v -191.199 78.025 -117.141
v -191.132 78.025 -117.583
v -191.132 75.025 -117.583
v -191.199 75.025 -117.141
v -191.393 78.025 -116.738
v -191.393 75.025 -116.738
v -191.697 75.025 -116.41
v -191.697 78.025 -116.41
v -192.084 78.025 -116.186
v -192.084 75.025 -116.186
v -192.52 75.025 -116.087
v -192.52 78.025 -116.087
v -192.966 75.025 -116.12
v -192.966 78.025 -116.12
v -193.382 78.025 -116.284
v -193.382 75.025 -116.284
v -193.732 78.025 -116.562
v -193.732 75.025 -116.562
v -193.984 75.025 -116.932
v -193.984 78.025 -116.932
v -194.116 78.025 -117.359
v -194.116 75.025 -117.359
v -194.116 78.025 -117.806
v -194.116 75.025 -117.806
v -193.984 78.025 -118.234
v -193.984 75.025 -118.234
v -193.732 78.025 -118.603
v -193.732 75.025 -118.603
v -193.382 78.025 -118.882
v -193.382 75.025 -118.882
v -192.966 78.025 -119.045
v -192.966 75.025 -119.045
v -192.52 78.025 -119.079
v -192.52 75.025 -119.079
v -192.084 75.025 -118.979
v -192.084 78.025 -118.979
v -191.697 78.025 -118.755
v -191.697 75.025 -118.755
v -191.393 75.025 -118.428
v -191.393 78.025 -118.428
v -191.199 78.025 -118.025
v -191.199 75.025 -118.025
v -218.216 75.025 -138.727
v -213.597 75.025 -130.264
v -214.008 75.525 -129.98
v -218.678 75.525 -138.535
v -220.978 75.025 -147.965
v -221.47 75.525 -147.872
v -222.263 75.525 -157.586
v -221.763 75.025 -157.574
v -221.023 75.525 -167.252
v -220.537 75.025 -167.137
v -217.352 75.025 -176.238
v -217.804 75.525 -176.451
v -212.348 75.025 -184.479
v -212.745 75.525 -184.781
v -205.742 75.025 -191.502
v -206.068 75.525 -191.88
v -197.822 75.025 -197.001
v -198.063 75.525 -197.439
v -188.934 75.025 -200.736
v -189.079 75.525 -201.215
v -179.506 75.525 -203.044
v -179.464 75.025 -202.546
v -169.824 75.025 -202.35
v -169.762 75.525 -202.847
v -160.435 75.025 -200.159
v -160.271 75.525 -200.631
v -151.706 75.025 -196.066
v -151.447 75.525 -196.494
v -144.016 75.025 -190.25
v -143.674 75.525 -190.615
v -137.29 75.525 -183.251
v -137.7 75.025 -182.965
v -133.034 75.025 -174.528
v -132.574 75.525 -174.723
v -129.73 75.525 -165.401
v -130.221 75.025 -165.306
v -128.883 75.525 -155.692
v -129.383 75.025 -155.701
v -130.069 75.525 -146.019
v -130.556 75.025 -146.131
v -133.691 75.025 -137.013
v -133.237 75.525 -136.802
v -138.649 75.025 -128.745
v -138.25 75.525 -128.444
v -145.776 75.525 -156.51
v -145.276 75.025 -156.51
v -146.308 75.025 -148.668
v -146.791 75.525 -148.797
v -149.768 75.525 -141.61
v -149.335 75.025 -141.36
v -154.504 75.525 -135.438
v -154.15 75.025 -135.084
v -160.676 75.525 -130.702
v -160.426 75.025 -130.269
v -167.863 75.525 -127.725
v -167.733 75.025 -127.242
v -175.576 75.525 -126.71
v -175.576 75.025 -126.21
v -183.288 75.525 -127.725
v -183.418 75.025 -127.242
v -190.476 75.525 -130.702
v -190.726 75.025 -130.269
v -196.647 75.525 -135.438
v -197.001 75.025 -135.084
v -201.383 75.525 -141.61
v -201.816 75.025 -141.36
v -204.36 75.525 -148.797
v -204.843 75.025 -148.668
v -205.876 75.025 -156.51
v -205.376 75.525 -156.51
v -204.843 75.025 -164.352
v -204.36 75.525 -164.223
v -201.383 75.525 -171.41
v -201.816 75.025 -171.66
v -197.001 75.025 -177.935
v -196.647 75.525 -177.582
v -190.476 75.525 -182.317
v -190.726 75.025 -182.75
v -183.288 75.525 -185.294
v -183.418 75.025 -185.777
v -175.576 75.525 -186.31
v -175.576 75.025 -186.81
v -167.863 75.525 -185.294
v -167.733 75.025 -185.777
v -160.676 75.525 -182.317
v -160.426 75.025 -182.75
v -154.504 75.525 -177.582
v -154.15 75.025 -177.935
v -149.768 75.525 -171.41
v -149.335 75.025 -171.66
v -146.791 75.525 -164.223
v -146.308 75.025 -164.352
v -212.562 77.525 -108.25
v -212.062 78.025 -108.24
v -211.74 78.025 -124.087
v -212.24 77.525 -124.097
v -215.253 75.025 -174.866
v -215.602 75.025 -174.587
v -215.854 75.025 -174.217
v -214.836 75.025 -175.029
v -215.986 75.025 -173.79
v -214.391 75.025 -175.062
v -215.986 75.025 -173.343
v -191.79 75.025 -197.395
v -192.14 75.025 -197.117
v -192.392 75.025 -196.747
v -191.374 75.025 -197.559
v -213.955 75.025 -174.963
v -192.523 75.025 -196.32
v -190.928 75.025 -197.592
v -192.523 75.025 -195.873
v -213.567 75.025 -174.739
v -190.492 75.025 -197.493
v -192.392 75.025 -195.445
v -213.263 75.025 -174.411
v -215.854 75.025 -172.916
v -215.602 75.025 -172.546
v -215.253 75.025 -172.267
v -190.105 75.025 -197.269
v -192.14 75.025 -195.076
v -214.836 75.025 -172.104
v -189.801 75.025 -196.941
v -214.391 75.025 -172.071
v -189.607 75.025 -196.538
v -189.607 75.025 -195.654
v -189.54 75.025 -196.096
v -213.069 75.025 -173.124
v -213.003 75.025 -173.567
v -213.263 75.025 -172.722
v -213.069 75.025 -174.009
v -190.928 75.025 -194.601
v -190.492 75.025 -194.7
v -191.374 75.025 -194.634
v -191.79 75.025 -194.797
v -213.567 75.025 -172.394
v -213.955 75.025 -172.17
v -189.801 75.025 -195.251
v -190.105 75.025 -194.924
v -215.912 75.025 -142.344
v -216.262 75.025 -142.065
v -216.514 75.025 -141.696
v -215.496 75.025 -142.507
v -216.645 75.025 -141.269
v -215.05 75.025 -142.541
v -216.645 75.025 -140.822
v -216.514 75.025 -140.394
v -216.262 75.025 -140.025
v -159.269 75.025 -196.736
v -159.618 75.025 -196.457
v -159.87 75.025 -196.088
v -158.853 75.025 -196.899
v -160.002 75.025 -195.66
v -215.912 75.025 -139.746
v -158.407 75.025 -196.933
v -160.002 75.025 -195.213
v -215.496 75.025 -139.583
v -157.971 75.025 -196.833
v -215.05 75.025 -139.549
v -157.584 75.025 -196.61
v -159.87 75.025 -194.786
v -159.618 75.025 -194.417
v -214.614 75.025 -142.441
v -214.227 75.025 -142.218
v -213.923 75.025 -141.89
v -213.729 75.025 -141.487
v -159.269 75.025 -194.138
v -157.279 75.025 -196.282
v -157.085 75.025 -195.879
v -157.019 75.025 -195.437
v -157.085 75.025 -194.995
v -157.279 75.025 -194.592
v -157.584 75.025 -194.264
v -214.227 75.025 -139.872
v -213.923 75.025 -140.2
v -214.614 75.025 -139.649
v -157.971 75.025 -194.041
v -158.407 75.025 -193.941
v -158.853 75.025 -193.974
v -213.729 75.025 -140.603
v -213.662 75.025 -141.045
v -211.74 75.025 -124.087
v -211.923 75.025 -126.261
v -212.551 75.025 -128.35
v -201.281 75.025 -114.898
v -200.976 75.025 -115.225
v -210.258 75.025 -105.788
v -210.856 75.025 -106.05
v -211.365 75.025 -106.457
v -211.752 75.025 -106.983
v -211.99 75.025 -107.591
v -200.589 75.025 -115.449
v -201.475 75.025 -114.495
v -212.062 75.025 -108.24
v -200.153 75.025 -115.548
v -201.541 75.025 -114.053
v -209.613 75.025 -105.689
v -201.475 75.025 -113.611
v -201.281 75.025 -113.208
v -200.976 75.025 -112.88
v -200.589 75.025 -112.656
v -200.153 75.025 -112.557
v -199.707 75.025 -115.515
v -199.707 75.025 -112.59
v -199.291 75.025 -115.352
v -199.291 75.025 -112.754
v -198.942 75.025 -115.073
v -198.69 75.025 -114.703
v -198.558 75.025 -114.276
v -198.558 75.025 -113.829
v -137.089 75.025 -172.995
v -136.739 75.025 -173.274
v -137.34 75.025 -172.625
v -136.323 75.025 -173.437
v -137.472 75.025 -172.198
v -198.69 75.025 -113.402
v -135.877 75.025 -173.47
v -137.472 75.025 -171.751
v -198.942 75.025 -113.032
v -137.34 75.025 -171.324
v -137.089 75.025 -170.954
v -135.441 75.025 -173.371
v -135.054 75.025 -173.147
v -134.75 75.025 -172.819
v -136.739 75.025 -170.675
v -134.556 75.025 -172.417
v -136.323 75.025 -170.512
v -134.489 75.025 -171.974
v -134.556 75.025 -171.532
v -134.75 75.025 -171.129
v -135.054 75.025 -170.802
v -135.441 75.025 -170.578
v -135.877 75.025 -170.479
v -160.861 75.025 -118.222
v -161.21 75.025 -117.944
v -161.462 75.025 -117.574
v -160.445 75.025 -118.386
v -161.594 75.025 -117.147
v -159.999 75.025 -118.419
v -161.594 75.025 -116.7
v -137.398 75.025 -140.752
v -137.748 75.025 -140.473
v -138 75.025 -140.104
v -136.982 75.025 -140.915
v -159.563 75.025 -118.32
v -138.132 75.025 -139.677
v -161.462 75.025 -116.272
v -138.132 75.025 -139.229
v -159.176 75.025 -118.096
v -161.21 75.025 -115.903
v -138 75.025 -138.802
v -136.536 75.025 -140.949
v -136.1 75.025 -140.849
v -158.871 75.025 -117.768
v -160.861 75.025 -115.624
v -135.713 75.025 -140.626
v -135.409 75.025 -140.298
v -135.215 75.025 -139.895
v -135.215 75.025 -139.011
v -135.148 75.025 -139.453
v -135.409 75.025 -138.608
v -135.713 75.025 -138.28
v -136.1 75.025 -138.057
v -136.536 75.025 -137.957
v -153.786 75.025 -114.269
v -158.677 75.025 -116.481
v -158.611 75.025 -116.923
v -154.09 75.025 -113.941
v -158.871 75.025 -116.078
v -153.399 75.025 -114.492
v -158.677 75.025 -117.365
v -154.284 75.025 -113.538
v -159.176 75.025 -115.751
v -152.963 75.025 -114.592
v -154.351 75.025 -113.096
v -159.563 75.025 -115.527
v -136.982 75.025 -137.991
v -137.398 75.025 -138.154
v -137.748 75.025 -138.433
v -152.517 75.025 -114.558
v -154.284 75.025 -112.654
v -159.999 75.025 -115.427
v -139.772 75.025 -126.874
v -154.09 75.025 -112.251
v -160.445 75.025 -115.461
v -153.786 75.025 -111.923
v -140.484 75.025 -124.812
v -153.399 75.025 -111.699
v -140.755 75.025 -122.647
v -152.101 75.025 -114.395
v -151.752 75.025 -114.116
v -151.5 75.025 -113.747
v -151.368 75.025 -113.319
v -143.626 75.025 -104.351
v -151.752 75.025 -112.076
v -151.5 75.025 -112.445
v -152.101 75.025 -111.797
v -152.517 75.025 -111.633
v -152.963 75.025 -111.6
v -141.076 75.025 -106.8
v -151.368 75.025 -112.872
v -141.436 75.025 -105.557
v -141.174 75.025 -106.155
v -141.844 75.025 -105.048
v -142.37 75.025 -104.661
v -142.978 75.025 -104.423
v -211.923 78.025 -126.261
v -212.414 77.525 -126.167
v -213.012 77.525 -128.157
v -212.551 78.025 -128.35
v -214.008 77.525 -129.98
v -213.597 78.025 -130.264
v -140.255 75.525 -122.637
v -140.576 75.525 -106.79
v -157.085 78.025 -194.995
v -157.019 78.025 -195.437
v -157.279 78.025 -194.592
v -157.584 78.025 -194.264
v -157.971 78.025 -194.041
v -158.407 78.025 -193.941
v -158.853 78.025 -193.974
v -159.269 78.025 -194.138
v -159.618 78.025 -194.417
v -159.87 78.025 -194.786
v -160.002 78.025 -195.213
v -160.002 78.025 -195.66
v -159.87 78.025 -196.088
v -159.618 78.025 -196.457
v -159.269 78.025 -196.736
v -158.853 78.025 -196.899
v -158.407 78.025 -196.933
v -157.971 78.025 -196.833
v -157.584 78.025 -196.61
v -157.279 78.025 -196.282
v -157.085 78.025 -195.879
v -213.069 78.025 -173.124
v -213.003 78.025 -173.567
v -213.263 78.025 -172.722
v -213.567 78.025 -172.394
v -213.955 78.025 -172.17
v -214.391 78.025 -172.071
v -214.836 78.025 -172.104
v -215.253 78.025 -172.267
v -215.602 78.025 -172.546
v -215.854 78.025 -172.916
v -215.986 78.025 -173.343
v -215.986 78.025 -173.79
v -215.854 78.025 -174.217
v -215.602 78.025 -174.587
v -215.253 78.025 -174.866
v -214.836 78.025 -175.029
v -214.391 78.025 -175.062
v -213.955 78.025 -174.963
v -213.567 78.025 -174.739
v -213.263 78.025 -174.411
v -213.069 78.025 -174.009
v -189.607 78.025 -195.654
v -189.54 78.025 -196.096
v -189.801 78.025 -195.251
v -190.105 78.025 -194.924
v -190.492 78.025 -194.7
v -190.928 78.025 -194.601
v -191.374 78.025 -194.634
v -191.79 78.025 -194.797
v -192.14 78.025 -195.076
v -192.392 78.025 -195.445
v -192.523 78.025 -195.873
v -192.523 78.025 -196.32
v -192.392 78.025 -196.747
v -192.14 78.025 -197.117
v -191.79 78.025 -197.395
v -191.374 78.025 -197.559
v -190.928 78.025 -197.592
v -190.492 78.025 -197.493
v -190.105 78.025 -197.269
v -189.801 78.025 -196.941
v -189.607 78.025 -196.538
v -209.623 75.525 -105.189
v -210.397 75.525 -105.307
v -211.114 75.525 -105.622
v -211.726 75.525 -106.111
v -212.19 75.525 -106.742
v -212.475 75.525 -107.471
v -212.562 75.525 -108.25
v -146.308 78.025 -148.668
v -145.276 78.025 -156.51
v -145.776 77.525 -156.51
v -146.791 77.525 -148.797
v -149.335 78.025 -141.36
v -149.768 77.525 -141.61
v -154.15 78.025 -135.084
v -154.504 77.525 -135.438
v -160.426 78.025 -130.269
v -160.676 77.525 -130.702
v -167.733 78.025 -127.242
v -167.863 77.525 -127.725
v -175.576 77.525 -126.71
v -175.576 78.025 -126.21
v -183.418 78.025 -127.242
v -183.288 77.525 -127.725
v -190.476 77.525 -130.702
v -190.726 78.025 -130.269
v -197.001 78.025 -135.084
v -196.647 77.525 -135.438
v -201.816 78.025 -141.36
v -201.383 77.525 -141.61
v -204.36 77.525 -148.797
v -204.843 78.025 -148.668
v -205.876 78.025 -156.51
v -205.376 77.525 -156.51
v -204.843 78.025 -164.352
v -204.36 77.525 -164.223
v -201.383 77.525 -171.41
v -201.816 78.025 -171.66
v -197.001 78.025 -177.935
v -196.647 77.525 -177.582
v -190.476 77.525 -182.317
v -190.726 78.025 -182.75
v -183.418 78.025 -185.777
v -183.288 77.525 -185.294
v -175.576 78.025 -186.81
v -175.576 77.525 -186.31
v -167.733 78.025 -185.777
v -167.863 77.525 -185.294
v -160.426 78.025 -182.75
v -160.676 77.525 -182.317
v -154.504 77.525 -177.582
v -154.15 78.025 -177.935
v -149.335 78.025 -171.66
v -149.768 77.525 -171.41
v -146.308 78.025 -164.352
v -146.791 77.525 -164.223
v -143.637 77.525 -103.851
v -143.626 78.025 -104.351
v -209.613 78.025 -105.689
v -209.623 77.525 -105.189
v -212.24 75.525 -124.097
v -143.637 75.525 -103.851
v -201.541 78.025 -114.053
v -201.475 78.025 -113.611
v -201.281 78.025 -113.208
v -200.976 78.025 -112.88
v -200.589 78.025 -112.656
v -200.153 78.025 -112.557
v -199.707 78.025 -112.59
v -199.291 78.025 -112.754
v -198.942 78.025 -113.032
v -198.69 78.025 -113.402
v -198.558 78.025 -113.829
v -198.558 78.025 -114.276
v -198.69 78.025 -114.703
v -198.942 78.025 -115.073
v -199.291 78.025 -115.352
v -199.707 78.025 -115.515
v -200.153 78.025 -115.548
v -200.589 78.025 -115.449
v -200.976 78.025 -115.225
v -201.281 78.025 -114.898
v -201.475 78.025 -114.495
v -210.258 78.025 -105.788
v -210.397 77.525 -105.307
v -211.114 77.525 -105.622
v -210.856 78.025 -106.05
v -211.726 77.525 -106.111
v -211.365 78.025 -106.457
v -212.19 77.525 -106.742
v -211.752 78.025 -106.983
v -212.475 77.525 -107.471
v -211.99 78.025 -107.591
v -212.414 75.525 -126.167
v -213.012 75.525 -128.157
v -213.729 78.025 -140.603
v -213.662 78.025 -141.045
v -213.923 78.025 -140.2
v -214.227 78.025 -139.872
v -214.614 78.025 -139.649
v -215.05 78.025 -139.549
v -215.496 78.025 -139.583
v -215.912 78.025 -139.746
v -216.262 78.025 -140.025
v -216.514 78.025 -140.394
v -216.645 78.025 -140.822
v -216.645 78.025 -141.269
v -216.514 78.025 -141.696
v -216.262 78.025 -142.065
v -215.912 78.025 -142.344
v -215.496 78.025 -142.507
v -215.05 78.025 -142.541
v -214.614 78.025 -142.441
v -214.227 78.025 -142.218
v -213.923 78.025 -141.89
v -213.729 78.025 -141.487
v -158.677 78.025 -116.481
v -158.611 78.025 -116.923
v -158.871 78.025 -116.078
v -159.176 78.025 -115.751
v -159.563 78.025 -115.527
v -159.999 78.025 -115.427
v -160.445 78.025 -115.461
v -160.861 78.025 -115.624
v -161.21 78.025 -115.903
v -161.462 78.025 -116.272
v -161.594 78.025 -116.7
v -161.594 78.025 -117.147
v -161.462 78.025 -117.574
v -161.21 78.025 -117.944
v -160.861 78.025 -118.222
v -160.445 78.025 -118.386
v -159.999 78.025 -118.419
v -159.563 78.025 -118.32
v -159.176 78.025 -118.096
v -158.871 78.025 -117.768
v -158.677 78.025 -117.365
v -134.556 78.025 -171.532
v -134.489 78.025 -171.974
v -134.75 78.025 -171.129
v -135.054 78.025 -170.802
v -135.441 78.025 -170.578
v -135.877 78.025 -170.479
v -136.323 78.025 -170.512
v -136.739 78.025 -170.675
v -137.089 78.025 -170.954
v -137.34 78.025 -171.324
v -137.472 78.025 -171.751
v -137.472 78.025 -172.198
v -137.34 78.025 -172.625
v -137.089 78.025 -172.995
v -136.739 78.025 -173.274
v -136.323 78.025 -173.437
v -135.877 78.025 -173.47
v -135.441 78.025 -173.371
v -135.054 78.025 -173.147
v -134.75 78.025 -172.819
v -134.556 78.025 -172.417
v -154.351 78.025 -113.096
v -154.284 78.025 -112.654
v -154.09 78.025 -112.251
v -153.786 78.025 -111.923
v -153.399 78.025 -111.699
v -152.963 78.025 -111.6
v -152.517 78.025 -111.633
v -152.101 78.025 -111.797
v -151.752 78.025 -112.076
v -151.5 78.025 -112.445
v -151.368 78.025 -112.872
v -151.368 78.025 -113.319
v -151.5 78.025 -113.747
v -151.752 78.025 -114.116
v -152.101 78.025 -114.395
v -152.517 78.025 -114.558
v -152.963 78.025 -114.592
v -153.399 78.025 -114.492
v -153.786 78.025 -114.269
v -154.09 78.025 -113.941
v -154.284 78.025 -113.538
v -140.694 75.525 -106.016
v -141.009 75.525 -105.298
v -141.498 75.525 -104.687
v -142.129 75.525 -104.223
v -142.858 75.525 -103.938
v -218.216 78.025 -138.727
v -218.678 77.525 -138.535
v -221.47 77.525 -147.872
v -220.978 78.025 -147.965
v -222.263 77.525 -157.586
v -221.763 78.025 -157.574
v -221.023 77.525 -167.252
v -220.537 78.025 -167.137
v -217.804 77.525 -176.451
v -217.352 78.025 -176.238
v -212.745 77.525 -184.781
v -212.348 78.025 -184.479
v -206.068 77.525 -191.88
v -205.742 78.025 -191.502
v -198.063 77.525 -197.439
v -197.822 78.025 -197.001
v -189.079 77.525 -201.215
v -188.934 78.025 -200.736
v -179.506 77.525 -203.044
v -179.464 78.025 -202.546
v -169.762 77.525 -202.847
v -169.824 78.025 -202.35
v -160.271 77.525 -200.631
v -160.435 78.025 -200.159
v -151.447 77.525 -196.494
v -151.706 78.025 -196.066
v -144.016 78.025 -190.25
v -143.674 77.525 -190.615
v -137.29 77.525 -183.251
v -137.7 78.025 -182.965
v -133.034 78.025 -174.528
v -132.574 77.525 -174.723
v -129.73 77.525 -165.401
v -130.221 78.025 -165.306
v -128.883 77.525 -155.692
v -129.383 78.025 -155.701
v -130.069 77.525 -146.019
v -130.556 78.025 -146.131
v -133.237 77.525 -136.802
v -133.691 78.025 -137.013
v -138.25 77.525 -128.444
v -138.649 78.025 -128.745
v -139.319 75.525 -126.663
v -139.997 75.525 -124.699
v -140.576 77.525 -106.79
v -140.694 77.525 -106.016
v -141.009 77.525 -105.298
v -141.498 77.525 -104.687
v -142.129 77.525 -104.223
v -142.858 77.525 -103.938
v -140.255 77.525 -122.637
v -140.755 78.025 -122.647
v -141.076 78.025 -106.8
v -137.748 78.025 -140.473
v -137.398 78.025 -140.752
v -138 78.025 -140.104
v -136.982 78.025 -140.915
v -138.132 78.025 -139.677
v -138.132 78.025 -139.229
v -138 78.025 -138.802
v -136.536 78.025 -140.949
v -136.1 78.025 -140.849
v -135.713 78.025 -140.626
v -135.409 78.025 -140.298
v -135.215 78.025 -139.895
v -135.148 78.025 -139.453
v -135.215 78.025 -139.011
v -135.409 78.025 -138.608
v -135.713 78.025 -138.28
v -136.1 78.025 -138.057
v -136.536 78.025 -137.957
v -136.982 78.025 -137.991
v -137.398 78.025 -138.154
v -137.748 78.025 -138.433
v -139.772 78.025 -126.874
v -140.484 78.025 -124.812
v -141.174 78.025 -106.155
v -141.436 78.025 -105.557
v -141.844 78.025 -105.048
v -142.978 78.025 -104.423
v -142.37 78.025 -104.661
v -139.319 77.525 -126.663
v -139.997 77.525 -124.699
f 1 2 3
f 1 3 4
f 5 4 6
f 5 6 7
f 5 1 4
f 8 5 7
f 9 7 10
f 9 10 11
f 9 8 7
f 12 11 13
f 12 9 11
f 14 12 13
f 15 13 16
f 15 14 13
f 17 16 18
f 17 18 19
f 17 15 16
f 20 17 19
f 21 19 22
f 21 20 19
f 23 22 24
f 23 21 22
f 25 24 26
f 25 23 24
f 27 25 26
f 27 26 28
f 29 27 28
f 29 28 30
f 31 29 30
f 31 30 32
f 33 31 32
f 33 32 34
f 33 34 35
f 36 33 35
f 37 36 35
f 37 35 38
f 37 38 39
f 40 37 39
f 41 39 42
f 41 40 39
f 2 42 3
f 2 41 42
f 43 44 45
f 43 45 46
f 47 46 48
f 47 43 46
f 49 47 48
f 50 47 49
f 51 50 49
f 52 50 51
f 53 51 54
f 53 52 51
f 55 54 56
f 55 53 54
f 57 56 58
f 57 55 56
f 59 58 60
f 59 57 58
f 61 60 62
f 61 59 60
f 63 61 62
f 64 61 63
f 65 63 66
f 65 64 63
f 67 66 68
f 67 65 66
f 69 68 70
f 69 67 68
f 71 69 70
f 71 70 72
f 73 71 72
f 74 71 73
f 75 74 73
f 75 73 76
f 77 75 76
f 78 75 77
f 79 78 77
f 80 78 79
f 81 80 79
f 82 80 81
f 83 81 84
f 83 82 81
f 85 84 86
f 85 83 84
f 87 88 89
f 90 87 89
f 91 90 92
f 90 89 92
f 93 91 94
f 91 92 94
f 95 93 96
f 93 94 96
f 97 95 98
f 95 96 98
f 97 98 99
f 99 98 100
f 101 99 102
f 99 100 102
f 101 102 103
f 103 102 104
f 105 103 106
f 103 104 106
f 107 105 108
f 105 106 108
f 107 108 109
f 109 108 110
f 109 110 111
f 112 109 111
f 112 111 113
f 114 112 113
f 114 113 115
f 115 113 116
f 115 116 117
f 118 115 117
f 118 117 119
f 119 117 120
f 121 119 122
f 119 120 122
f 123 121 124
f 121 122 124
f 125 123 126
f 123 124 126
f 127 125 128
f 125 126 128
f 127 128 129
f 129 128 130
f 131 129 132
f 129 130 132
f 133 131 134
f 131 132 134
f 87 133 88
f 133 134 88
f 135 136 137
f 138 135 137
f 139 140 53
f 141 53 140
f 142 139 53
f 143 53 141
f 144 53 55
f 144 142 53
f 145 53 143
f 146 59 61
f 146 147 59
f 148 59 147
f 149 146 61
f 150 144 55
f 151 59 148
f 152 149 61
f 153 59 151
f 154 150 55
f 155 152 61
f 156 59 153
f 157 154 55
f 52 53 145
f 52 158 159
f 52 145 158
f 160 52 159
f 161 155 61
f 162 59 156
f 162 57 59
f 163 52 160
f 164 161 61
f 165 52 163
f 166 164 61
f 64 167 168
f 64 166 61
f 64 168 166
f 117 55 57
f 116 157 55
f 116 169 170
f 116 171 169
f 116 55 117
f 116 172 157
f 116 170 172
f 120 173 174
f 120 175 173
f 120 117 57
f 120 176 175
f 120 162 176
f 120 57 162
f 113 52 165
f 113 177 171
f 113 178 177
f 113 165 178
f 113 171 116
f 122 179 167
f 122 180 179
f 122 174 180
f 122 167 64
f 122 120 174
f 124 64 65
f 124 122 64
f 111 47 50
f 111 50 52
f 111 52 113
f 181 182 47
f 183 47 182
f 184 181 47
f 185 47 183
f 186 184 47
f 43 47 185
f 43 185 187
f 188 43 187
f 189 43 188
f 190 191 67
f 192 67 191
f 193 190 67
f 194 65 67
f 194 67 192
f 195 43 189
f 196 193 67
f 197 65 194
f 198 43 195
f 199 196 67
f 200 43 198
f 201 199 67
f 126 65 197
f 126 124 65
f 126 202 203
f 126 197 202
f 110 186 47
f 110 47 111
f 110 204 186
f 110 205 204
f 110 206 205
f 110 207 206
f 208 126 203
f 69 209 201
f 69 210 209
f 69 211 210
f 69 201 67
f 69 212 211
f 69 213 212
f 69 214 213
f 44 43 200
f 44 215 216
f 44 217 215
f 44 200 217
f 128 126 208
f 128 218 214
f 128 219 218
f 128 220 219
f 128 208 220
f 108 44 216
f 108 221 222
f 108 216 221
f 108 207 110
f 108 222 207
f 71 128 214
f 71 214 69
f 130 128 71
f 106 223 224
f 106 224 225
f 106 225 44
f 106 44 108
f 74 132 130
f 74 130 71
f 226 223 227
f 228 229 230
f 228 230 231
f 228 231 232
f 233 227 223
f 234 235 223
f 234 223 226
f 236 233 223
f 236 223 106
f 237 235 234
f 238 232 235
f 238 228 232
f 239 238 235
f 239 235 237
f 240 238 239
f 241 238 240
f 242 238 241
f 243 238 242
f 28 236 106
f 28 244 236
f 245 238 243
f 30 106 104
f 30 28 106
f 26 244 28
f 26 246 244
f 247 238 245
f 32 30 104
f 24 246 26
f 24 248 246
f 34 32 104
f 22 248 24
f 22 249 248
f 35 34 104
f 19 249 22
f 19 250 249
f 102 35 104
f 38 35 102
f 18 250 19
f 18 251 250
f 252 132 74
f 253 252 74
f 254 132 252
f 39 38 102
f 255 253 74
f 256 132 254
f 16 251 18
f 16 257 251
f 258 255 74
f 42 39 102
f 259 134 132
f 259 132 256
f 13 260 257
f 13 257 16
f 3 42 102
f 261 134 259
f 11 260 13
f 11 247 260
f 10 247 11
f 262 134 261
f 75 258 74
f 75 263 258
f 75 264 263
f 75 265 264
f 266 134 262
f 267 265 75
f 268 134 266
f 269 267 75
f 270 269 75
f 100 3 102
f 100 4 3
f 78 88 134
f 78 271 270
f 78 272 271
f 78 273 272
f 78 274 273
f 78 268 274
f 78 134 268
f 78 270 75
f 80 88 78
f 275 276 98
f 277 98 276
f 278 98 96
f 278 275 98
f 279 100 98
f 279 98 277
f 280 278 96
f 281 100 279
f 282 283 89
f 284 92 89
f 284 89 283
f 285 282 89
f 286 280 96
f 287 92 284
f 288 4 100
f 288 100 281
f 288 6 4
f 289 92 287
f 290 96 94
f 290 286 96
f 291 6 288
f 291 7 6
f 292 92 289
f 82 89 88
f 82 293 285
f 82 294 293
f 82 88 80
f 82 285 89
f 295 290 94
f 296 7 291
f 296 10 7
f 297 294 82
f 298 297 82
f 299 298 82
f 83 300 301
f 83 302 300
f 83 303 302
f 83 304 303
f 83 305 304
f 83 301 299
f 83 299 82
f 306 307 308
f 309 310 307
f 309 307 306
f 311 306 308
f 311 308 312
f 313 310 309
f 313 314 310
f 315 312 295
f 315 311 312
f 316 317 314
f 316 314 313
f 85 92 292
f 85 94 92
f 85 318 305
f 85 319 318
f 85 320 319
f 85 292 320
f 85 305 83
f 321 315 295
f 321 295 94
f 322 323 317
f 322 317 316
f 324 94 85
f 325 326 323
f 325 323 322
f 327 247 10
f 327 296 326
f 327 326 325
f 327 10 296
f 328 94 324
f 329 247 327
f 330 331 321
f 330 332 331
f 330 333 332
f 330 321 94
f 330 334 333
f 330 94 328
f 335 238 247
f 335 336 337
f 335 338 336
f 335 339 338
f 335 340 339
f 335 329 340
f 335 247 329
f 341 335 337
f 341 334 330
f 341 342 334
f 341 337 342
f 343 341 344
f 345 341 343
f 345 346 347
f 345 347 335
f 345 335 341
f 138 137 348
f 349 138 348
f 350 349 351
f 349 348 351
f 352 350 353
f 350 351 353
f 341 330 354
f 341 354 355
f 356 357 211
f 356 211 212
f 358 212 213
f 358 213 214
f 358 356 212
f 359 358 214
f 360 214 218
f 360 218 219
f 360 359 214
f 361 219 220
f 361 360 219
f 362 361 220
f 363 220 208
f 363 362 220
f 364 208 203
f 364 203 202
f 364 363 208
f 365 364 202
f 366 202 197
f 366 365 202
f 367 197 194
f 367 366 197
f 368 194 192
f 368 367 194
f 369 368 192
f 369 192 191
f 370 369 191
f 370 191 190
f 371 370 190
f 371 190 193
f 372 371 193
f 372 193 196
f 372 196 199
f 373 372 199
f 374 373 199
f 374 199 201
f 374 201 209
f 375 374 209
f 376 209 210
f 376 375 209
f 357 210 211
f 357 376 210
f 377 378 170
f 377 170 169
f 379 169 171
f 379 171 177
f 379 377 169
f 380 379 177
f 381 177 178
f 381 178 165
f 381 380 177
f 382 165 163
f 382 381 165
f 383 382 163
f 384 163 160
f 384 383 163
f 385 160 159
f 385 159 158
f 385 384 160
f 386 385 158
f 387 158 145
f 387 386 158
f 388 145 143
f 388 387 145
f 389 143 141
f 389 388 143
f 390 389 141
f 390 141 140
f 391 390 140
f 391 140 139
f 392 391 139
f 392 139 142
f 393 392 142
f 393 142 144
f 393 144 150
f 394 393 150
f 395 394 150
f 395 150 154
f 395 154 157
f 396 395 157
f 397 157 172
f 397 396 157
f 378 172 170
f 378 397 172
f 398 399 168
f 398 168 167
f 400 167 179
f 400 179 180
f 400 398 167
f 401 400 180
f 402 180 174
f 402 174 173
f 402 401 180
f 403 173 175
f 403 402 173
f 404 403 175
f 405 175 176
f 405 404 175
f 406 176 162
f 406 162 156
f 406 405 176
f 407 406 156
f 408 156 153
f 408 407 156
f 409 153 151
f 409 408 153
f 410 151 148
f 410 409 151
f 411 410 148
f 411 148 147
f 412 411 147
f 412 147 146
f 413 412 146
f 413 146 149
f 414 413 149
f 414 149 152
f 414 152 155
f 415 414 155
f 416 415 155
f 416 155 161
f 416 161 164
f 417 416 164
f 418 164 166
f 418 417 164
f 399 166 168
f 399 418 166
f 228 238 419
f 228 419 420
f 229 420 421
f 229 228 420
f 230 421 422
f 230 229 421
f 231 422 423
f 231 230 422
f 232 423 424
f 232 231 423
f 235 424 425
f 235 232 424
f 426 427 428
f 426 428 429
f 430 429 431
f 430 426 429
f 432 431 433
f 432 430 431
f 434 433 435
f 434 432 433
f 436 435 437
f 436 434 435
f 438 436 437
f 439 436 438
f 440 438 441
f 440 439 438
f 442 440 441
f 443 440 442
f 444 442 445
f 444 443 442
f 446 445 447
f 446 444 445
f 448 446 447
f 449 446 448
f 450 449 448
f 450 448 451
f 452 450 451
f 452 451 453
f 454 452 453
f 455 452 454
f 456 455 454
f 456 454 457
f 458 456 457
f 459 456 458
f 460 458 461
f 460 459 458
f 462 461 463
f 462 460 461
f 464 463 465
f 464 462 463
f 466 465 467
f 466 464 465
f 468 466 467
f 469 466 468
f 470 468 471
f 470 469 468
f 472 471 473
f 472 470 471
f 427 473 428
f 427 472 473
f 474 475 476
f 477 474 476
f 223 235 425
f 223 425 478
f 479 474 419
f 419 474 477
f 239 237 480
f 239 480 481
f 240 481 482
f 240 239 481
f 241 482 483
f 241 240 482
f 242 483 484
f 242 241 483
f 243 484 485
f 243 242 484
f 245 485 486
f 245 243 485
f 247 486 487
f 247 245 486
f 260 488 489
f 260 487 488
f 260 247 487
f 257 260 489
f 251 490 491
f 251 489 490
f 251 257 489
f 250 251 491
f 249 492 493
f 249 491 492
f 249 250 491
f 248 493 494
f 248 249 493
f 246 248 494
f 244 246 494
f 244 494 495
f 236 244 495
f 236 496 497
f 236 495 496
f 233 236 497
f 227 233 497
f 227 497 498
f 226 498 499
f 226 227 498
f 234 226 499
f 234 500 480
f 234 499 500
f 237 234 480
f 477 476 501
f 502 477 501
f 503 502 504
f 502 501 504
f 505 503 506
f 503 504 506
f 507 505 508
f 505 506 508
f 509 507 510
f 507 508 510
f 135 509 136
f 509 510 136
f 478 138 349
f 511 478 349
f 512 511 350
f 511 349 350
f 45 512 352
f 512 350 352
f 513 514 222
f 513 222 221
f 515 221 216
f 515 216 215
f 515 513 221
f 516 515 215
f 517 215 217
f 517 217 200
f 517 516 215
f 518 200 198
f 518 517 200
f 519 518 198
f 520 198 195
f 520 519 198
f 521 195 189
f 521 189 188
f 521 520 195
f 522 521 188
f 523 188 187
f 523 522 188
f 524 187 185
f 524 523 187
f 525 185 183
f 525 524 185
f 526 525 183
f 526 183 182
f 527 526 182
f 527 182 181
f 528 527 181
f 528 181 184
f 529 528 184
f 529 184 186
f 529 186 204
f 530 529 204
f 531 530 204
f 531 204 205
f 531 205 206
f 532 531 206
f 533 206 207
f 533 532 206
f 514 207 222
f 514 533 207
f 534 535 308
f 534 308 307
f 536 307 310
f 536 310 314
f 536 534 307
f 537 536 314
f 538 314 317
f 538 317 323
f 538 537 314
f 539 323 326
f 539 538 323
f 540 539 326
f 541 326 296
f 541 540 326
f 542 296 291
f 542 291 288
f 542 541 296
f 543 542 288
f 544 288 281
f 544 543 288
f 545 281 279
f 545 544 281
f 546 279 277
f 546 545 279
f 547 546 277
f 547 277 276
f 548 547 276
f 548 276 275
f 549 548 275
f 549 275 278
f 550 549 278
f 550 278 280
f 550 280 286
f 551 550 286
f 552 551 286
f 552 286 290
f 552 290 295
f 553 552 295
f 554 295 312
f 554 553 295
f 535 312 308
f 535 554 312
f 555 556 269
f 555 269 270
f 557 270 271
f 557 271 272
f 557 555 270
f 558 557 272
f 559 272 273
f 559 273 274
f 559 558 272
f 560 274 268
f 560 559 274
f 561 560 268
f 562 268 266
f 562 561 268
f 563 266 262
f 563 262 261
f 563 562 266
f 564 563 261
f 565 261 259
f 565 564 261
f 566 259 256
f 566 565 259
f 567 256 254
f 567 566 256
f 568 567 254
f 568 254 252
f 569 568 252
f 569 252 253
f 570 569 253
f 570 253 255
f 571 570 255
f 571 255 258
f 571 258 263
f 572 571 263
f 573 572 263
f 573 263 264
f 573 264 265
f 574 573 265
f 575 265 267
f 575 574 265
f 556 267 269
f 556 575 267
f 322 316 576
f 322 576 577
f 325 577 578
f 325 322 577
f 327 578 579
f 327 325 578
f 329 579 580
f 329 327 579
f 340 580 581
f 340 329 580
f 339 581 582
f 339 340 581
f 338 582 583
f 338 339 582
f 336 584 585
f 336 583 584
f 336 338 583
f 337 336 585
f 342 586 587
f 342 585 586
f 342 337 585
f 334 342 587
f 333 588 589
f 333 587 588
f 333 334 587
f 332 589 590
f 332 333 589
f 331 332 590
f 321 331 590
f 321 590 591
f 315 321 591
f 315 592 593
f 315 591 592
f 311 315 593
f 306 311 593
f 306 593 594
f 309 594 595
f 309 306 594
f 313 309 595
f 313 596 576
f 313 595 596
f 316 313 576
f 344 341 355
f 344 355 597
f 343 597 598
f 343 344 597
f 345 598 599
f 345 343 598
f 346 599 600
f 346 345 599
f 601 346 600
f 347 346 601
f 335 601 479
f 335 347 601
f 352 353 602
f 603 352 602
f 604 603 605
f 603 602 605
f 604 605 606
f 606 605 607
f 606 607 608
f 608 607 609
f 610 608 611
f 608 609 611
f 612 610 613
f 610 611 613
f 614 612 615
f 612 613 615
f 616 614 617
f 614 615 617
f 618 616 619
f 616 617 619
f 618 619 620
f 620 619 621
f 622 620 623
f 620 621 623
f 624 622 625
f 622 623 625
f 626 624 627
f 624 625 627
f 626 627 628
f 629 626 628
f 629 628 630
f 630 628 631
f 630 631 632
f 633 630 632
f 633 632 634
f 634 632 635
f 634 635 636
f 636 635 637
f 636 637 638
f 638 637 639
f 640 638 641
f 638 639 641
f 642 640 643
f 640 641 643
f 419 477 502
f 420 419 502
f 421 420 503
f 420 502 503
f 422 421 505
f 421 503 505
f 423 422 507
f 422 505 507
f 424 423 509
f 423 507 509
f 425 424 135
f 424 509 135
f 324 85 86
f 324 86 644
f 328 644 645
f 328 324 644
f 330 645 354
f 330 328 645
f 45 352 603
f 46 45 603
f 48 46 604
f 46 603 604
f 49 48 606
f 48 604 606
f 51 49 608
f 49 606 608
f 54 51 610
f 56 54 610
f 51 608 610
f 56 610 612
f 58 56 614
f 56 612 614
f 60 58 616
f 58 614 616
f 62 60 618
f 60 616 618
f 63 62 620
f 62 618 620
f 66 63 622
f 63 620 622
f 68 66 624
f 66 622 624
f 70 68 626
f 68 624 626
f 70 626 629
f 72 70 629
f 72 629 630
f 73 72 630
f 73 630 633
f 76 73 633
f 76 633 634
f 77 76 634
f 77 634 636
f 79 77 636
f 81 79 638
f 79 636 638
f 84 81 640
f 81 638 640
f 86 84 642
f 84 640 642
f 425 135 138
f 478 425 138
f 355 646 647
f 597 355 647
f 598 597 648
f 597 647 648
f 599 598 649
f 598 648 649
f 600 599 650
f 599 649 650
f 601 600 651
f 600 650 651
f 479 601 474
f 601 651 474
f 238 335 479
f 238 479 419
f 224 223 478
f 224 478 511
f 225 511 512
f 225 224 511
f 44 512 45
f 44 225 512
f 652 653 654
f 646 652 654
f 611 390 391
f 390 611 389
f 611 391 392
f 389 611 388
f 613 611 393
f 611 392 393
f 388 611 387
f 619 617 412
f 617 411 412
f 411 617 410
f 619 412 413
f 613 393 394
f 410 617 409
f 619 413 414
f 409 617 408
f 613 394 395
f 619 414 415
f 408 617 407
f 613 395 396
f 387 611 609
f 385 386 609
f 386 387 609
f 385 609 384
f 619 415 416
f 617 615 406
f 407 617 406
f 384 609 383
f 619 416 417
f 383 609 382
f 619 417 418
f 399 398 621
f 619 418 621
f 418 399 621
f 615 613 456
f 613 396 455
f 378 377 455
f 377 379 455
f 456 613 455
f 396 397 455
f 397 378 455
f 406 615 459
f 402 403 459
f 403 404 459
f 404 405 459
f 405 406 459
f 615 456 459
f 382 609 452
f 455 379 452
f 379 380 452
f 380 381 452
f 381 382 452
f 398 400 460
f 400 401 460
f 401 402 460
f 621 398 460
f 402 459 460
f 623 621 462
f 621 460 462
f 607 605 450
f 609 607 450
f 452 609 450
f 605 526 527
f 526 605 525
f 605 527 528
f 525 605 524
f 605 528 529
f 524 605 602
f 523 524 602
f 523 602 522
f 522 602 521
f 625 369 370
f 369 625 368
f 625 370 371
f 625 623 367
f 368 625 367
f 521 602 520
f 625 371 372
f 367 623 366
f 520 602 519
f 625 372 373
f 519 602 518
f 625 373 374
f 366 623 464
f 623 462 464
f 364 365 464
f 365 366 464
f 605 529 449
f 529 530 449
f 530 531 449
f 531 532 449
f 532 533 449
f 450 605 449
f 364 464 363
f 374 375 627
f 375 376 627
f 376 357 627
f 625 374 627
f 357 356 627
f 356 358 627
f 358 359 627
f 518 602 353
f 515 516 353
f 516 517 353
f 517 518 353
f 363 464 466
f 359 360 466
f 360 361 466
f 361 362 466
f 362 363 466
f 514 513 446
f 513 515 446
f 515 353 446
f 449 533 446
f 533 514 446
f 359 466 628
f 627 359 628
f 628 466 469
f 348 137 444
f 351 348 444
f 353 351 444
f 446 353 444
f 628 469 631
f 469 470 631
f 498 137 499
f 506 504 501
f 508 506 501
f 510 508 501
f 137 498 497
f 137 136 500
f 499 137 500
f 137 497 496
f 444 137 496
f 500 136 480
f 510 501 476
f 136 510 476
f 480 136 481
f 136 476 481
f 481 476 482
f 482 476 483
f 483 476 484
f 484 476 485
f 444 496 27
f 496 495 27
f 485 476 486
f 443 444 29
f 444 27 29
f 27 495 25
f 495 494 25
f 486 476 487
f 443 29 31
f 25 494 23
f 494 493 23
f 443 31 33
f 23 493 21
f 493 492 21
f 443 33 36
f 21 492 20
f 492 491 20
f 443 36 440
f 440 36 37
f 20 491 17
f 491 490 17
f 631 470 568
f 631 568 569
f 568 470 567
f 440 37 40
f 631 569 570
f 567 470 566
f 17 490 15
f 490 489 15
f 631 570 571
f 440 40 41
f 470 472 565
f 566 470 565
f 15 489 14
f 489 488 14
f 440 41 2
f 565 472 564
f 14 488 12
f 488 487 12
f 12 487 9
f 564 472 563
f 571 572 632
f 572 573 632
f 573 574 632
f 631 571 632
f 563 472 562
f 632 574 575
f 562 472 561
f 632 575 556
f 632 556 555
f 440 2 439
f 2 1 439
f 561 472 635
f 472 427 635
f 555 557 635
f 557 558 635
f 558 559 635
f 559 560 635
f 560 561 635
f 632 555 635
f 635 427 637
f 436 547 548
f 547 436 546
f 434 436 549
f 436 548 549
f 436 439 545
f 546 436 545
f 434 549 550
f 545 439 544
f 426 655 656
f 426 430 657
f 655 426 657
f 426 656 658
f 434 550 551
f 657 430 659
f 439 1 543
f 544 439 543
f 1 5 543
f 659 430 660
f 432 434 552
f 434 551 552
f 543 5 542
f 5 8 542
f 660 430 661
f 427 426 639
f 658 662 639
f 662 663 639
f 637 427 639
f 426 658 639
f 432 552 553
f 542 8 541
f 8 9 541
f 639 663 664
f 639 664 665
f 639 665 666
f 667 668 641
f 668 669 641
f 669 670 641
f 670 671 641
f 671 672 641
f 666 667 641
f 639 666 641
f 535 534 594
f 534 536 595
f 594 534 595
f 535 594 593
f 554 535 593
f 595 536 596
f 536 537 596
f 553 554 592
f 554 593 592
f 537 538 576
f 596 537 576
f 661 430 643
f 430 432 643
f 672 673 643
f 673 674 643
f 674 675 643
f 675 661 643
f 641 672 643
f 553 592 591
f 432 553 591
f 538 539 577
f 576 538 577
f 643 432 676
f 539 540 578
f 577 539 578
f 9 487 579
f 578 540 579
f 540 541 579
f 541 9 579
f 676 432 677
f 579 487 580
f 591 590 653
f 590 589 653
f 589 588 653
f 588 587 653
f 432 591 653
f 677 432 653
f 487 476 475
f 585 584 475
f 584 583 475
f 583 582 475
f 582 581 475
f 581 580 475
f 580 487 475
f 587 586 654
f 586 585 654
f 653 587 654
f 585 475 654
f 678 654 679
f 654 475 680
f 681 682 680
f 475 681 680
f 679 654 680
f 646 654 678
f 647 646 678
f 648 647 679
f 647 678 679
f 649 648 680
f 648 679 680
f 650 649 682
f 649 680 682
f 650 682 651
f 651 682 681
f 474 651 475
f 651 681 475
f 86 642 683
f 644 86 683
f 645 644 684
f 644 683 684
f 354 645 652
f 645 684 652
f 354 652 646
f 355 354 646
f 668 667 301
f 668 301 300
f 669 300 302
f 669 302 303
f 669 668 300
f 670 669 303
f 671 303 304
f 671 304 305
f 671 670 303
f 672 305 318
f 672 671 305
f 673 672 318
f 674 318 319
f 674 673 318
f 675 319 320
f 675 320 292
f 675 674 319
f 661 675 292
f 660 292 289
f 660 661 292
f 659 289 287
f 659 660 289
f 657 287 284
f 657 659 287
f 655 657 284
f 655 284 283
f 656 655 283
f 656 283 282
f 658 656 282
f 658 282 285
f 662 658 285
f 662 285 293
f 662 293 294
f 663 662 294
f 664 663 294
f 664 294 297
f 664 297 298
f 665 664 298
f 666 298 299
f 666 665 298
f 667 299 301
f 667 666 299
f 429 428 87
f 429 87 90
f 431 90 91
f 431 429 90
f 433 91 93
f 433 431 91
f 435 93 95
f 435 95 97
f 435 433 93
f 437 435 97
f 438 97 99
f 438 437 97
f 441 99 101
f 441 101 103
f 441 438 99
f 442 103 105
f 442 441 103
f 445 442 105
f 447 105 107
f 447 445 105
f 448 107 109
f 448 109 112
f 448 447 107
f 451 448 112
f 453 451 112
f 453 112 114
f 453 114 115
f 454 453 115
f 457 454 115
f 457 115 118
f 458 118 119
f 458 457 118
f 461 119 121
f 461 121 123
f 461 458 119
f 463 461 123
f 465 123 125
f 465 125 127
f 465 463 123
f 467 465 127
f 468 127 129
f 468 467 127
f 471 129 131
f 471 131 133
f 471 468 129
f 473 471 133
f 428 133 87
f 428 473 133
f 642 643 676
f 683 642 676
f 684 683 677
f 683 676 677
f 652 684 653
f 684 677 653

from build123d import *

# Parameters (mm, degrees)
SKETCH_1_R               = 1.5
SKETCH_1_R_2             = 29.8
EXTRUDE_1_DEPTH          = 3
CHAMFER_1_SIZE           = 0.5
CUT_EXTRUDE_1_DEPTH      = 302.180394913
CUT_EXTRUDE_1_DEPTH_BACK = 302.180394913
SKETCH_2_R               = 1.5
CUT_EXTRUDE_2_DEPTH      = 302.180394913
CUT_EXTRUDE_2_DEPTH_BACK = 302.180394913
SKETCH_3_R               = 1.5


with BuildPart() as part:
    # 草图1 → 凸台-拉伸1 (new body)
    with BuildSketch(Plane.XZ.offset(-78.025173071)):
        with BuildLine():
            Line((-212.561517714, -108.249692404), (-212.240178336, -124.096924988))
            ThreePointArc((-212.240178336, -124.096924988), (-212.661273384, -127.177841531), (-214.008389255, -129.980455778))
            ThreePointArc((-214.008389255, -129.980455778), (-174.628775953, -203.200190572), (-138.249712047, -128.44427297))
            ThreePointArc((-138.249712047, -128.44427297), (-139.709332875, -125.698571817), (-140.25497588, -122.637258129))
            Line((-140.25497588, -122.637258129), (-140.576315258, -106.790025545))
            ThreePointArc((-140.576315258, -106.790025545), (-141.497820174, -104.686954783), (-143.636518146, -103.851461562))
            Line((-143.636518146, -103.851461562), (-209.622953731, -105.189489516))
            ThreePointArc((-209.622953731, -105.189489516), (-211.726024493, -106.110994432), (-212.561517714, -108.249692404))
        make_face()
        with Locations((-136.648445194, -139.453062321)):
            Circle(SKETCH_1_R, mode=Mode.SUBTRACT)
        with Locations((-175.575532096, -156.509788424)):
            Circle(SKETCH_1_R_2, mode=Mode.SUBTRACT)
        with Locations((-135.988998284, -171.974468852)):
            Circle(SKETCH_1_R, mode=Mode.SUBTRACT)
        with Locations((-191.040212525, -196.096322235)):
            Circle(SKETCH_1_R, mode=Mode.SUBTRACT)
        with Locations((-215.162065908, -141.045107995)):
            Circle(SKETCH_1_R, mode=Mode.SUBTRACT)
        with Locations((-192.632258198, -117.582701522)):
            Circle(SKETCH_1_R, mode=Mode.SUBTRACT)
        with Locations((-160.110851668, -116.923254612)):
            Circle(SKETCH_1_R, mode=Mode.SUBTRACT)
        with Locations((-214.502618998, -173.566514526)):
            Circle(SKETCH_1_R, mode=Mode.SUBTRACT)
        with Locations((-158.518805994, -195.436875326)):
            Circle(SKETCH_1_R, mode=Mode.SUBTRACT)
    extrude(amount=EXTRUDE_1_DEPTH)

    # 倒角1
    chamfer_1_edges = [part.edges().sort_by_distance(p)[0] for p in [
        (-212.400848023, 78.025173077, -116.173308696),
        (-211.72602449, 78.025173077, -106.110994432),
        (-176.629735936, 78.025173076, -104.520475539),
        (-141.497820172, 78.025173075, -104.686954784),
        (-211.72602449, 75.025173077, -106.110994432),
        (-212.400848023, 75.025173077, -116.173308696),
        (-212.661273381, 75.025173077, -127.177841532),
        (-174.628775951, 75.025173075, -203.200190573),
        (-205.375532094, 78.025173077, -156.509788424),
        (-205.375532094, 75.025173077, -156.509788424),
        (-139.709332873, 75.025173075, -125.698571818),
        (-140.415645567, 75.025173075, -114.713641837),
        (-141.497820172, 75.025173075, -104.686954784),
        (-140.415645566, 78.025173075, -114.713641837),
        (-176.629735936, 75.025173076, -104.520475539),
        (-139.709332873, 78.025173075, -125.698571818),
        (-174.62877595, 78.025173075, -203.200190573),
        (-212.661273381, 78.025173077, -127.177841532),
    ]]
    chamfer(chamfer_1_edges, length=CHAMFER_1_SIZE)

    # 草图2 → 切除-拉伸1 (cut, two sides: drawn at the far end of the back side and taken through both)
    with BuildSketch(Plane(origin=(2e-09, 78.025173071, -1e-09), x_dir=(1.0, -3.1446611841336594e-11, 0), z_dir=(3.1446611841336594e-11, 1.0, -6.574611909583631e-12)).offset(-CUT_EXTRUDE_1_DEPTH_BACK)):
        with Locations(Location((-200.041202679, 114.05266186, 0), (0, 0, 180))):
            Circle(SKETCH_2_R)
    extrude(amount=CUT_EXTRUDE_1_DEPTH + CUT_EXTRUDE_1_DEPTH_BACK, mode=Mode.SUBTRACT)

    # 草图3 → 切除-拉伸2 (cut, two sides: drawn at the far end of the back side and taken through both)
    with BuildSketch(Plane(origin=(2e-09, 78.025173071, -1e-09), x_dir=(1.0, -3.1446611841336594e-11, 0), z_dir=(3.1446611841336594e-11, 1.0, -6.574611909583631e-12)).offset(-CUT_EXTRUDE_2_DEPTH_BACK)):
        with Locations(Location((-152.851097985, 113.09577309, 0), (0, 0, 180))):
            Circle(SKETCH_3_R)
    extrude(amount=CUT_EXTRUDE_2_DEPTH + CUT_EXTRUDE_2_DEPTH_BACK, mode=Mode.SUBTRACT)


solid = part.part
